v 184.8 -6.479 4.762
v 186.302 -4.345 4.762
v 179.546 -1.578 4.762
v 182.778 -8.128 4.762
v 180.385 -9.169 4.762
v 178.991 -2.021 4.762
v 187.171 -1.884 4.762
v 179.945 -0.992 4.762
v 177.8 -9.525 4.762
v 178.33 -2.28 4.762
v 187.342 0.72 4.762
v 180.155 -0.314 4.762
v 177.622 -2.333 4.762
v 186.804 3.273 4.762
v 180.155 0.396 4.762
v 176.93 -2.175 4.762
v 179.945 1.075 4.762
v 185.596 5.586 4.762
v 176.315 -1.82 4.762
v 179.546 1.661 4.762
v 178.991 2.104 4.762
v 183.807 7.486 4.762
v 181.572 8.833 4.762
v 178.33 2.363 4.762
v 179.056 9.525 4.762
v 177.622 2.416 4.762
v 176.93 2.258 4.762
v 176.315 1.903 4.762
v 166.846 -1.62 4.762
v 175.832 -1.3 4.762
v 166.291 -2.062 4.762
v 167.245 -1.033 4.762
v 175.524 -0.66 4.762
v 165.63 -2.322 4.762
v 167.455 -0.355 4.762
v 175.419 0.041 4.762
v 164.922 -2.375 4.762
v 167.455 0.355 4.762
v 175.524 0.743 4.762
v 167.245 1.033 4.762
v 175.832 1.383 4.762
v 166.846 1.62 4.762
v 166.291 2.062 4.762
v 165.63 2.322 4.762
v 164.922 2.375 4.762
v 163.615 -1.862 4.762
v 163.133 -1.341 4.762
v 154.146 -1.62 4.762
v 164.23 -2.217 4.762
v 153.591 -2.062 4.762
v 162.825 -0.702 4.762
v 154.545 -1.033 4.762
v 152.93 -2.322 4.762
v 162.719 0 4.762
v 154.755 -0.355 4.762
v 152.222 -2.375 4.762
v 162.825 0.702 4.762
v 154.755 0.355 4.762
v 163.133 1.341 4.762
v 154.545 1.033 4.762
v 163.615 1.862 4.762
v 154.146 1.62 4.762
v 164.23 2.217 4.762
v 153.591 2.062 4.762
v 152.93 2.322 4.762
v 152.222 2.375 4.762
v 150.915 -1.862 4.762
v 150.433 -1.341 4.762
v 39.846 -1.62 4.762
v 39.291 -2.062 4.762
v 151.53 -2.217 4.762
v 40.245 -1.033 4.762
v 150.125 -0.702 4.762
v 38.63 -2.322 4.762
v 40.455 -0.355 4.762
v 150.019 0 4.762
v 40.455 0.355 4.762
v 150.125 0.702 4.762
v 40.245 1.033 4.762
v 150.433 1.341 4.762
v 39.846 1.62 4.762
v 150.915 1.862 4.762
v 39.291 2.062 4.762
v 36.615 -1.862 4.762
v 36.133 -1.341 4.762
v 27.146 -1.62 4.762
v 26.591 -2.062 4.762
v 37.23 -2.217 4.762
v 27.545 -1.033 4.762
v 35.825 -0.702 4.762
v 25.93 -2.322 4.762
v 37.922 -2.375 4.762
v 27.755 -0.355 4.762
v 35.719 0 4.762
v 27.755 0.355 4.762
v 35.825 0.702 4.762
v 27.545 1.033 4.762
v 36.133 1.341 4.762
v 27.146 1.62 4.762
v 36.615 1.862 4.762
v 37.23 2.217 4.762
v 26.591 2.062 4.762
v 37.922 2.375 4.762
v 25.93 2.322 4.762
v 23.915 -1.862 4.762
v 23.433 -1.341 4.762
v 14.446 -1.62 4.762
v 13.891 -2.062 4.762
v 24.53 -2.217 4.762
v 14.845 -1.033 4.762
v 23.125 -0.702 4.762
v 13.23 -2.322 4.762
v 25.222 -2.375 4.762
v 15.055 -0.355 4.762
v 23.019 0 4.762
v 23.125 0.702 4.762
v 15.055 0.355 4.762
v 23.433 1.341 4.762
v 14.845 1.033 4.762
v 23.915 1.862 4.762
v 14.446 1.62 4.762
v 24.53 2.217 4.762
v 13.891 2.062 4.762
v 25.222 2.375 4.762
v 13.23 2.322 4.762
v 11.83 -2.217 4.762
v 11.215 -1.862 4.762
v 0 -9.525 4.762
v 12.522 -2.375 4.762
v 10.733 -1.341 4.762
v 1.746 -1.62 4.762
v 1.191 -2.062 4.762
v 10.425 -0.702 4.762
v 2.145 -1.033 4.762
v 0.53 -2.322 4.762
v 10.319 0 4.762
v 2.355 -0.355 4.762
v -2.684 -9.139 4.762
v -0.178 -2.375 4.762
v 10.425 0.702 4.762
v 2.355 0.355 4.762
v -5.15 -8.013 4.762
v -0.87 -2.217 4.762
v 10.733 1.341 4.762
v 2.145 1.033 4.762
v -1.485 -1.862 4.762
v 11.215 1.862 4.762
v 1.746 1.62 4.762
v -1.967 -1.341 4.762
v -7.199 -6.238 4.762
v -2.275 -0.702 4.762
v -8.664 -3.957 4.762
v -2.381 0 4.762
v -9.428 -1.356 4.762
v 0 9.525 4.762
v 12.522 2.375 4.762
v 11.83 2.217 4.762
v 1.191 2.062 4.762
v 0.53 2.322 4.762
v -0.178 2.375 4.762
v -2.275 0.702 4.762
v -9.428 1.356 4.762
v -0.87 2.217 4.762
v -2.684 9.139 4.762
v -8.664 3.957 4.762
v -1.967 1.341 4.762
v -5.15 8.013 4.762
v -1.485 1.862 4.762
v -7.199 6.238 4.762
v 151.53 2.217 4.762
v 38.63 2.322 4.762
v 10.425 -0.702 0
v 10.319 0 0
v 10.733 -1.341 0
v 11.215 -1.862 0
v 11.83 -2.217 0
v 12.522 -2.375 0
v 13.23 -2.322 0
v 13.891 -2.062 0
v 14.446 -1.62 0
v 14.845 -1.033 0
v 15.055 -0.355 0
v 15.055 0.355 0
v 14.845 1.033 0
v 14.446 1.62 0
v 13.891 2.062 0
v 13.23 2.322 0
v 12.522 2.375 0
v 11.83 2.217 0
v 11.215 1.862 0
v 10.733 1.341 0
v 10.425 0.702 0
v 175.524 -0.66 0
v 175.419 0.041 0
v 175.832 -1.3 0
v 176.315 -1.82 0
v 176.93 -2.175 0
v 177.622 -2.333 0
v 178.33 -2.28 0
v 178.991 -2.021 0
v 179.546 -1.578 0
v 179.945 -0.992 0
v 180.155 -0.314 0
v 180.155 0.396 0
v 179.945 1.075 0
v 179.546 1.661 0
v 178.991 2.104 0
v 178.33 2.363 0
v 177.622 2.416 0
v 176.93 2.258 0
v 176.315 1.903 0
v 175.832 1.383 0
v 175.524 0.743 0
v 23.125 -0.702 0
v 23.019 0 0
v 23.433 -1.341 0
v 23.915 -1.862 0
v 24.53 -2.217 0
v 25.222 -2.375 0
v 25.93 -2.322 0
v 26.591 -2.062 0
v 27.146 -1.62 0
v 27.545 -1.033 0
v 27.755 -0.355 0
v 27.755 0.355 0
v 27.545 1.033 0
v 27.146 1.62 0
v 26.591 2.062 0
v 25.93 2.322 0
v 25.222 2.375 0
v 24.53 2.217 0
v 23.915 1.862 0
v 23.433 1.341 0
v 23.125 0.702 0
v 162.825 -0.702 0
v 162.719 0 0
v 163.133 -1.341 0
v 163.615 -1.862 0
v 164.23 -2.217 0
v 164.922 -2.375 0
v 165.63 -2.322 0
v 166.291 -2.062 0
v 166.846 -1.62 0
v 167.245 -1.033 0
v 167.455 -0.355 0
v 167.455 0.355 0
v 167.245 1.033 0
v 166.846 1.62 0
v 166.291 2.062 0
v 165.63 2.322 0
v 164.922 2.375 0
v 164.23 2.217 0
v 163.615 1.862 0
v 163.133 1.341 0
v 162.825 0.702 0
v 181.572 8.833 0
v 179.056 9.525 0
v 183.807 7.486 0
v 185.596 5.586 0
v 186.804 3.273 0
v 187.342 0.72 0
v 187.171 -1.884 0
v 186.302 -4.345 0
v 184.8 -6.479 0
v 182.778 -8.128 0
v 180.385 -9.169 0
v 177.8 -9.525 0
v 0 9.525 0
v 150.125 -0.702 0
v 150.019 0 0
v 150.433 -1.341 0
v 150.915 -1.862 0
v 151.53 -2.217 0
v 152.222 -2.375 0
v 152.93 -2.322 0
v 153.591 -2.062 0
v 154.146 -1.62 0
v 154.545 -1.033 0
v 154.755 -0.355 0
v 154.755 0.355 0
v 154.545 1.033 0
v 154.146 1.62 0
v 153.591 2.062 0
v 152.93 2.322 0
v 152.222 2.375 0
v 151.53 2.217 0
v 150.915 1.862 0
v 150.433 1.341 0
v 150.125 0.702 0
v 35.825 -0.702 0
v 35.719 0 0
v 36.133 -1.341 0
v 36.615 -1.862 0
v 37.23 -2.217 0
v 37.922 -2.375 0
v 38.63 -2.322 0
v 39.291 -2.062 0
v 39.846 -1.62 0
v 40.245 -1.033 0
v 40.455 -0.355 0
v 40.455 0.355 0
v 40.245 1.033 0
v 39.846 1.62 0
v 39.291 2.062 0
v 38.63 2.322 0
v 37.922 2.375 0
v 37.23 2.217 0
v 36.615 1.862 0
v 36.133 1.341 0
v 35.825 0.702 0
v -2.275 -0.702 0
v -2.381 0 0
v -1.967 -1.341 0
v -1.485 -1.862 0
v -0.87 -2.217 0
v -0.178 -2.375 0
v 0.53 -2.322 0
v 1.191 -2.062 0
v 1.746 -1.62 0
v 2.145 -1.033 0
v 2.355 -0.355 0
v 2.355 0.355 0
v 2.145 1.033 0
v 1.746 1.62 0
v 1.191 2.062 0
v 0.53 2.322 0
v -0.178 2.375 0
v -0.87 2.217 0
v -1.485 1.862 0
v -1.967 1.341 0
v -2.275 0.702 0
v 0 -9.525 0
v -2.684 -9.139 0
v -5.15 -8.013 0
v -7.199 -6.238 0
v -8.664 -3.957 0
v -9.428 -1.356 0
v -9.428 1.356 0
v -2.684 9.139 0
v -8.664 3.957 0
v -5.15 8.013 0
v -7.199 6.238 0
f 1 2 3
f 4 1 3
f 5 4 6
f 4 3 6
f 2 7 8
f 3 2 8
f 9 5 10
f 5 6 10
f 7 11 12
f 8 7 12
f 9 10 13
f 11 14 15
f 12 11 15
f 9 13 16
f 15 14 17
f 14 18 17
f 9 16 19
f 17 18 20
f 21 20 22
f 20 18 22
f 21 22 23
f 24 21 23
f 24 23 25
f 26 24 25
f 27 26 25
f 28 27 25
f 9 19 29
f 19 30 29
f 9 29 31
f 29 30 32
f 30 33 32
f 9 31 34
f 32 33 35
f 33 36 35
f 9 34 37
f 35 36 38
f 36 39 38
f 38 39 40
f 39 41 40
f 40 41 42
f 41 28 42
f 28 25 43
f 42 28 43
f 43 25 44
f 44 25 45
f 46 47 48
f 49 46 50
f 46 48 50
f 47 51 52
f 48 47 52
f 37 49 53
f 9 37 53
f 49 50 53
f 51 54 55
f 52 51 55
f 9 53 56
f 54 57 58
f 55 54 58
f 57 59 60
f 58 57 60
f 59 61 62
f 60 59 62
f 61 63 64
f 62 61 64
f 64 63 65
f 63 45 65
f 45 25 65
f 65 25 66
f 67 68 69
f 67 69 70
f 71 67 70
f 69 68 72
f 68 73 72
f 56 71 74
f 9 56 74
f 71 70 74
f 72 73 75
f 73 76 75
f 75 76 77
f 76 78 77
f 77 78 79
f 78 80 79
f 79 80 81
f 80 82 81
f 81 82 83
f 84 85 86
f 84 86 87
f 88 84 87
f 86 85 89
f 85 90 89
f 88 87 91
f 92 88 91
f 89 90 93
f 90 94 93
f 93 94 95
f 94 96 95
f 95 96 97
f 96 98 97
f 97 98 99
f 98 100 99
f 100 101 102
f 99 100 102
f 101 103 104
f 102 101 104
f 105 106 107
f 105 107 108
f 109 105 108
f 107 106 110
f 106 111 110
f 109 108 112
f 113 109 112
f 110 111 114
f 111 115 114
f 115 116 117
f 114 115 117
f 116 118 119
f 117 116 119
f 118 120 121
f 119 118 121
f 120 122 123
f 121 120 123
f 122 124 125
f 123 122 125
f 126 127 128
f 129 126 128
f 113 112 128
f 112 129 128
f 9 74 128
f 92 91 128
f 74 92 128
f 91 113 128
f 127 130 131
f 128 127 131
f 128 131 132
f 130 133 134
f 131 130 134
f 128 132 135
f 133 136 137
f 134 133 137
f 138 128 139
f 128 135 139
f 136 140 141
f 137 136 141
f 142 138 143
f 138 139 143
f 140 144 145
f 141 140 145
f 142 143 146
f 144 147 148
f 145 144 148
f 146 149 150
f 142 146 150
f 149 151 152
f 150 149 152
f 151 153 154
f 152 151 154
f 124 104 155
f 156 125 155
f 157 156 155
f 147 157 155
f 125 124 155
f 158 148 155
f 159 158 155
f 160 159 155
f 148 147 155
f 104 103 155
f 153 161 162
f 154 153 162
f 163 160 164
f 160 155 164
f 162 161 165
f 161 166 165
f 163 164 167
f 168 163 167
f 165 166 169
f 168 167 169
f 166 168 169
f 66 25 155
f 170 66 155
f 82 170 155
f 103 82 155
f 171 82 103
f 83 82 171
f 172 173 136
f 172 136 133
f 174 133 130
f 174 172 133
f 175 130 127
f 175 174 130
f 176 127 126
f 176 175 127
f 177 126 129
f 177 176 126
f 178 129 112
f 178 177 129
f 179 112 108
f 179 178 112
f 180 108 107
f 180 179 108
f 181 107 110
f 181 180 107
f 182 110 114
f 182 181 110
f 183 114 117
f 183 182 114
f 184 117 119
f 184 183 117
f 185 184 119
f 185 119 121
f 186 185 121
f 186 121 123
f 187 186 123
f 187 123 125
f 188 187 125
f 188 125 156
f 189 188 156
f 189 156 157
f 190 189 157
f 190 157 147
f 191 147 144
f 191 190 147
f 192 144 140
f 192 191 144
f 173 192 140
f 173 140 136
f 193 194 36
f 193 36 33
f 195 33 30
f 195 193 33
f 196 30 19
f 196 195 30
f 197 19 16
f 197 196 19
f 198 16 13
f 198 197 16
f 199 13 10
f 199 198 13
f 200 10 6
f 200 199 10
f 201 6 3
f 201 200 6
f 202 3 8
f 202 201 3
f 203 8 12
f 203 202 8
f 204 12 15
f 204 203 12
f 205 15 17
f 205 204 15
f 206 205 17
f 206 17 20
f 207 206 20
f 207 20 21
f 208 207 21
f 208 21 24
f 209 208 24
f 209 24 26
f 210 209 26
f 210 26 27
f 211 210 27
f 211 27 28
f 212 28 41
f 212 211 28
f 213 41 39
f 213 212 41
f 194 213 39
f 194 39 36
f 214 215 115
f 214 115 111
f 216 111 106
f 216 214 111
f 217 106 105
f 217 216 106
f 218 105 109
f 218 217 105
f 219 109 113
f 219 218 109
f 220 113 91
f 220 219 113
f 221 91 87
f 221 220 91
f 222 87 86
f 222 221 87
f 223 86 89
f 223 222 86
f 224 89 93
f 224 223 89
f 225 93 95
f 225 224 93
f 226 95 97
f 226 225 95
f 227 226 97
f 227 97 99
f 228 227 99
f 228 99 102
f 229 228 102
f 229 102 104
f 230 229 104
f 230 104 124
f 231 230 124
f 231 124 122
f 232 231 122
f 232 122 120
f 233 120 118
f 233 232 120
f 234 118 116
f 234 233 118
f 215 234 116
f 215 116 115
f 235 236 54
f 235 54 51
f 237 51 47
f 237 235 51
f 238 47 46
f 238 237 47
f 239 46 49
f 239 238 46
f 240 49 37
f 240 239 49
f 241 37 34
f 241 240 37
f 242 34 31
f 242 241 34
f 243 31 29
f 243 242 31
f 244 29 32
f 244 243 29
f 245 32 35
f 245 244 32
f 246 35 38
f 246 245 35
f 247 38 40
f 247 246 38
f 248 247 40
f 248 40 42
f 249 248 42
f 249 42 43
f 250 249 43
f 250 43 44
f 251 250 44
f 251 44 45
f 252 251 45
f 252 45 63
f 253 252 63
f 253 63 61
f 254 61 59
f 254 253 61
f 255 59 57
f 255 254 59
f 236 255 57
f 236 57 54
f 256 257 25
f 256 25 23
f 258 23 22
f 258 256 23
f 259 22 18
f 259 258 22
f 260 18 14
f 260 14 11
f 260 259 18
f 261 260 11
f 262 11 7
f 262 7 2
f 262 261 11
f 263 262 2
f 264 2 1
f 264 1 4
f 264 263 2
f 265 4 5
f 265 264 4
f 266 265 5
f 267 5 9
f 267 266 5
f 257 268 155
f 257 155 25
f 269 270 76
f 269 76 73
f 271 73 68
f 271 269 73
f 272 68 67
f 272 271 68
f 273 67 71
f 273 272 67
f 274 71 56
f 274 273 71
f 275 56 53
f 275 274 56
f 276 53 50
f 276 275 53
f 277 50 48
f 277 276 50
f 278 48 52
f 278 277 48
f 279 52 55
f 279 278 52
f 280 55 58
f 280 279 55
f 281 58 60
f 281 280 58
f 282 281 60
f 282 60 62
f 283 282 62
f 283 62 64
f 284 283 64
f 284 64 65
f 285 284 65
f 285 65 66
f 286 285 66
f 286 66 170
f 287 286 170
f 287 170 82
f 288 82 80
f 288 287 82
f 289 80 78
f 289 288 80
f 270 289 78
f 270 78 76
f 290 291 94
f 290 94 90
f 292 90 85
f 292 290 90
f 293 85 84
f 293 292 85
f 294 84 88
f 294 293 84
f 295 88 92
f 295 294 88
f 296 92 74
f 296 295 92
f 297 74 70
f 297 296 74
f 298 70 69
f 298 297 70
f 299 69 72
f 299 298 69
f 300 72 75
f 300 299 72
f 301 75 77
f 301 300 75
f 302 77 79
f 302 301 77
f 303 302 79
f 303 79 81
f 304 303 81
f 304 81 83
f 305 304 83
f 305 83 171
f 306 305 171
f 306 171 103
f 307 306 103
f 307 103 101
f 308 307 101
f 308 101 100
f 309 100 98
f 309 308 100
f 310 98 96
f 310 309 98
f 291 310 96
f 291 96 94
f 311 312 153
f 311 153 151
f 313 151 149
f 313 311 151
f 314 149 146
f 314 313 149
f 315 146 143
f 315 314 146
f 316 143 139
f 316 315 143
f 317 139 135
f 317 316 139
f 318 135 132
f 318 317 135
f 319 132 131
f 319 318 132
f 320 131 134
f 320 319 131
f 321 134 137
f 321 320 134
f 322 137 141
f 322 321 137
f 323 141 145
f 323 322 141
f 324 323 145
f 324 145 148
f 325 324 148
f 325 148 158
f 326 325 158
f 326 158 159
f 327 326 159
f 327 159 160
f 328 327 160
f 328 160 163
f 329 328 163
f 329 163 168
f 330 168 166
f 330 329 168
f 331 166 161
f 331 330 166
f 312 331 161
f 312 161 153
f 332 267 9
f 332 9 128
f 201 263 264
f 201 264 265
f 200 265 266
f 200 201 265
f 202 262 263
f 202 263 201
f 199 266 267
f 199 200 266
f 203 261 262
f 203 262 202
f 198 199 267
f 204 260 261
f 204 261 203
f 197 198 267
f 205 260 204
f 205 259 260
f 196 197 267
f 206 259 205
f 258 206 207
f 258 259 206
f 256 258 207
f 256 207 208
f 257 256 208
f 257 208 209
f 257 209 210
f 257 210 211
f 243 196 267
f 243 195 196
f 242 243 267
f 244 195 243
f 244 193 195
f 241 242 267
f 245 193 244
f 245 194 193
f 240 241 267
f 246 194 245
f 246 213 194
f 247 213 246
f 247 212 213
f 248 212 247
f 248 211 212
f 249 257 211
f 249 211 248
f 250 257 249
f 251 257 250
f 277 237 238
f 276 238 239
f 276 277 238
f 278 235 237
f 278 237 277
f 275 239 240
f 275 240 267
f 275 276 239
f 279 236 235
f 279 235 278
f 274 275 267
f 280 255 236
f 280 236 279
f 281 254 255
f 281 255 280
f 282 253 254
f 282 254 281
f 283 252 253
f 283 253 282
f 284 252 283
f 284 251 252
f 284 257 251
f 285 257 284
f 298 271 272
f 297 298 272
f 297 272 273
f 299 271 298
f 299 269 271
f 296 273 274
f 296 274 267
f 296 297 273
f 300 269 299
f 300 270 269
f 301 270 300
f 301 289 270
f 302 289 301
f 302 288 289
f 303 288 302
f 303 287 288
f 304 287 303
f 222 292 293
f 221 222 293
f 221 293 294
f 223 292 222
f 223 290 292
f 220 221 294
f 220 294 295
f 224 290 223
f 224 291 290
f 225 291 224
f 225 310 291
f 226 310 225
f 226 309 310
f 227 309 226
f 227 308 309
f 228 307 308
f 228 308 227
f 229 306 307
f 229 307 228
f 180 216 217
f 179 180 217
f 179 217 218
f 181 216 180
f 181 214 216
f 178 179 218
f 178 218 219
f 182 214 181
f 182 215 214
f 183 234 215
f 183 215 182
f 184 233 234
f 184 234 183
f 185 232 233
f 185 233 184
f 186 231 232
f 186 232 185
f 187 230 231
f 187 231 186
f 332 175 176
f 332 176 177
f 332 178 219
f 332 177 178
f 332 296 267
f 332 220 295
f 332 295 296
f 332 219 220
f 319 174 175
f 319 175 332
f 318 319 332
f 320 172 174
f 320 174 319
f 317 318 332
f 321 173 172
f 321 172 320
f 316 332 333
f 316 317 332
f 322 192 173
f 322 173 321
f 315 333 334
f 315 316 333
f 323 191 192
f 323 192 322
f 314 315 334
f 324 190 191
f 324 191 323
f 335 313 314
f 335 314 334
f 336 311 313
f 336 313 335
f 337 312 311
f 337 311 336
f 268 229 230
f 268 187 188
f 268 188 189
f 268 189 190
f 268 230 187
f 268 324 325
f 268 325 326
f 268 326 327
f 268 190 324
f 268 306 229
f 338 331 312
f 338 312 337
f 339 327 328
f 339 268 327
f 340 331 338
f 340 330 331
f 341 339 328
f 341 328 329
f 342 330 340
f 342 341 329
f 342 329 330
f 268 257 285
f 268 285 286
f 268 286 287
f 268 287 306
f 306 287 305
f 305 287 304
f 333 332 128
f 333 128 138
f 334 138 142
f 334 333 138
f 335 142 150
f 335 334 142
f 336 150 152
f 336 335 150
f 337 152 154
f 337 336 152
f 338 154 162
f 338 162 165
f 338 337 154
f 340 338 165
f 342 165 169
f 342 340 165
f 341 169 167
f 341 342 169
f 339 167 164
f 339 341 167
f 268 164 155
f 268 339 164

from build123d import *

# Parameters (mm, degrees)
SKETCH1_R           = 2.38125
BOSS_EXTRUDE1_DEPTH = 4.7625


with BuildPart() as part:
    # Sketch1 → Boss-Extrude1 (new body)
    with BuildSketch(Plane.XY):
        with BuildLine():
            Line((0, 9.525), (179.055725947, 9.525))
            ThreePointArc((179.055725947, 9.525), (187.345605876, -0.58786798), (177.799932549, -9.525))
            Line((177.799932549, -9.525), (0, -9.525))
            ThreePointArc((0, -9.525), (-9.525, 0), (0, 9.525))
        make_face()
        with Locations(Location((0, 0, 0), (0, 0, 180))):
            Circle(SKETCH1_R, mode=Mode.SUBTRACT)
        with Locations(Location((12.7, 0, 0), (0, 0, 180))):
            Circle(SKETCH1_R, mode=Mode.SUBTRACT)
        with Locations(Location((25.4, 0, 0), (0, 0, 180))):
            Circle(SKETCH1_R, mode=Mode.SUBTRACT)
        with Locations(Location((38.1, 0, 0), (0, 0, 180))):
            Circle(SKETCH1_R, mode=Mode.SUBTRACT)
        with Locations(Location((177.799932549, 0.041391524, 0), (0, 0, 180))):
            Circle(SKETCH1_R, mode=Mode.SUBTRACT)
        with Locations(Location((165.1, 2.22e-07, 0), (0, 0, 180))):
            Circle(SKETCH1_R, mode=Mode.SUBTRACT)
        with Locations(Location((152.4, 2.7e-08, 0), (0, 0, 180))):
            Circle(SKETCH1_R, mode=Mode.SUBTRACT)
    extrude(amount=BOSS_EXTRUDE1_DEPTH)


solid = part.part
